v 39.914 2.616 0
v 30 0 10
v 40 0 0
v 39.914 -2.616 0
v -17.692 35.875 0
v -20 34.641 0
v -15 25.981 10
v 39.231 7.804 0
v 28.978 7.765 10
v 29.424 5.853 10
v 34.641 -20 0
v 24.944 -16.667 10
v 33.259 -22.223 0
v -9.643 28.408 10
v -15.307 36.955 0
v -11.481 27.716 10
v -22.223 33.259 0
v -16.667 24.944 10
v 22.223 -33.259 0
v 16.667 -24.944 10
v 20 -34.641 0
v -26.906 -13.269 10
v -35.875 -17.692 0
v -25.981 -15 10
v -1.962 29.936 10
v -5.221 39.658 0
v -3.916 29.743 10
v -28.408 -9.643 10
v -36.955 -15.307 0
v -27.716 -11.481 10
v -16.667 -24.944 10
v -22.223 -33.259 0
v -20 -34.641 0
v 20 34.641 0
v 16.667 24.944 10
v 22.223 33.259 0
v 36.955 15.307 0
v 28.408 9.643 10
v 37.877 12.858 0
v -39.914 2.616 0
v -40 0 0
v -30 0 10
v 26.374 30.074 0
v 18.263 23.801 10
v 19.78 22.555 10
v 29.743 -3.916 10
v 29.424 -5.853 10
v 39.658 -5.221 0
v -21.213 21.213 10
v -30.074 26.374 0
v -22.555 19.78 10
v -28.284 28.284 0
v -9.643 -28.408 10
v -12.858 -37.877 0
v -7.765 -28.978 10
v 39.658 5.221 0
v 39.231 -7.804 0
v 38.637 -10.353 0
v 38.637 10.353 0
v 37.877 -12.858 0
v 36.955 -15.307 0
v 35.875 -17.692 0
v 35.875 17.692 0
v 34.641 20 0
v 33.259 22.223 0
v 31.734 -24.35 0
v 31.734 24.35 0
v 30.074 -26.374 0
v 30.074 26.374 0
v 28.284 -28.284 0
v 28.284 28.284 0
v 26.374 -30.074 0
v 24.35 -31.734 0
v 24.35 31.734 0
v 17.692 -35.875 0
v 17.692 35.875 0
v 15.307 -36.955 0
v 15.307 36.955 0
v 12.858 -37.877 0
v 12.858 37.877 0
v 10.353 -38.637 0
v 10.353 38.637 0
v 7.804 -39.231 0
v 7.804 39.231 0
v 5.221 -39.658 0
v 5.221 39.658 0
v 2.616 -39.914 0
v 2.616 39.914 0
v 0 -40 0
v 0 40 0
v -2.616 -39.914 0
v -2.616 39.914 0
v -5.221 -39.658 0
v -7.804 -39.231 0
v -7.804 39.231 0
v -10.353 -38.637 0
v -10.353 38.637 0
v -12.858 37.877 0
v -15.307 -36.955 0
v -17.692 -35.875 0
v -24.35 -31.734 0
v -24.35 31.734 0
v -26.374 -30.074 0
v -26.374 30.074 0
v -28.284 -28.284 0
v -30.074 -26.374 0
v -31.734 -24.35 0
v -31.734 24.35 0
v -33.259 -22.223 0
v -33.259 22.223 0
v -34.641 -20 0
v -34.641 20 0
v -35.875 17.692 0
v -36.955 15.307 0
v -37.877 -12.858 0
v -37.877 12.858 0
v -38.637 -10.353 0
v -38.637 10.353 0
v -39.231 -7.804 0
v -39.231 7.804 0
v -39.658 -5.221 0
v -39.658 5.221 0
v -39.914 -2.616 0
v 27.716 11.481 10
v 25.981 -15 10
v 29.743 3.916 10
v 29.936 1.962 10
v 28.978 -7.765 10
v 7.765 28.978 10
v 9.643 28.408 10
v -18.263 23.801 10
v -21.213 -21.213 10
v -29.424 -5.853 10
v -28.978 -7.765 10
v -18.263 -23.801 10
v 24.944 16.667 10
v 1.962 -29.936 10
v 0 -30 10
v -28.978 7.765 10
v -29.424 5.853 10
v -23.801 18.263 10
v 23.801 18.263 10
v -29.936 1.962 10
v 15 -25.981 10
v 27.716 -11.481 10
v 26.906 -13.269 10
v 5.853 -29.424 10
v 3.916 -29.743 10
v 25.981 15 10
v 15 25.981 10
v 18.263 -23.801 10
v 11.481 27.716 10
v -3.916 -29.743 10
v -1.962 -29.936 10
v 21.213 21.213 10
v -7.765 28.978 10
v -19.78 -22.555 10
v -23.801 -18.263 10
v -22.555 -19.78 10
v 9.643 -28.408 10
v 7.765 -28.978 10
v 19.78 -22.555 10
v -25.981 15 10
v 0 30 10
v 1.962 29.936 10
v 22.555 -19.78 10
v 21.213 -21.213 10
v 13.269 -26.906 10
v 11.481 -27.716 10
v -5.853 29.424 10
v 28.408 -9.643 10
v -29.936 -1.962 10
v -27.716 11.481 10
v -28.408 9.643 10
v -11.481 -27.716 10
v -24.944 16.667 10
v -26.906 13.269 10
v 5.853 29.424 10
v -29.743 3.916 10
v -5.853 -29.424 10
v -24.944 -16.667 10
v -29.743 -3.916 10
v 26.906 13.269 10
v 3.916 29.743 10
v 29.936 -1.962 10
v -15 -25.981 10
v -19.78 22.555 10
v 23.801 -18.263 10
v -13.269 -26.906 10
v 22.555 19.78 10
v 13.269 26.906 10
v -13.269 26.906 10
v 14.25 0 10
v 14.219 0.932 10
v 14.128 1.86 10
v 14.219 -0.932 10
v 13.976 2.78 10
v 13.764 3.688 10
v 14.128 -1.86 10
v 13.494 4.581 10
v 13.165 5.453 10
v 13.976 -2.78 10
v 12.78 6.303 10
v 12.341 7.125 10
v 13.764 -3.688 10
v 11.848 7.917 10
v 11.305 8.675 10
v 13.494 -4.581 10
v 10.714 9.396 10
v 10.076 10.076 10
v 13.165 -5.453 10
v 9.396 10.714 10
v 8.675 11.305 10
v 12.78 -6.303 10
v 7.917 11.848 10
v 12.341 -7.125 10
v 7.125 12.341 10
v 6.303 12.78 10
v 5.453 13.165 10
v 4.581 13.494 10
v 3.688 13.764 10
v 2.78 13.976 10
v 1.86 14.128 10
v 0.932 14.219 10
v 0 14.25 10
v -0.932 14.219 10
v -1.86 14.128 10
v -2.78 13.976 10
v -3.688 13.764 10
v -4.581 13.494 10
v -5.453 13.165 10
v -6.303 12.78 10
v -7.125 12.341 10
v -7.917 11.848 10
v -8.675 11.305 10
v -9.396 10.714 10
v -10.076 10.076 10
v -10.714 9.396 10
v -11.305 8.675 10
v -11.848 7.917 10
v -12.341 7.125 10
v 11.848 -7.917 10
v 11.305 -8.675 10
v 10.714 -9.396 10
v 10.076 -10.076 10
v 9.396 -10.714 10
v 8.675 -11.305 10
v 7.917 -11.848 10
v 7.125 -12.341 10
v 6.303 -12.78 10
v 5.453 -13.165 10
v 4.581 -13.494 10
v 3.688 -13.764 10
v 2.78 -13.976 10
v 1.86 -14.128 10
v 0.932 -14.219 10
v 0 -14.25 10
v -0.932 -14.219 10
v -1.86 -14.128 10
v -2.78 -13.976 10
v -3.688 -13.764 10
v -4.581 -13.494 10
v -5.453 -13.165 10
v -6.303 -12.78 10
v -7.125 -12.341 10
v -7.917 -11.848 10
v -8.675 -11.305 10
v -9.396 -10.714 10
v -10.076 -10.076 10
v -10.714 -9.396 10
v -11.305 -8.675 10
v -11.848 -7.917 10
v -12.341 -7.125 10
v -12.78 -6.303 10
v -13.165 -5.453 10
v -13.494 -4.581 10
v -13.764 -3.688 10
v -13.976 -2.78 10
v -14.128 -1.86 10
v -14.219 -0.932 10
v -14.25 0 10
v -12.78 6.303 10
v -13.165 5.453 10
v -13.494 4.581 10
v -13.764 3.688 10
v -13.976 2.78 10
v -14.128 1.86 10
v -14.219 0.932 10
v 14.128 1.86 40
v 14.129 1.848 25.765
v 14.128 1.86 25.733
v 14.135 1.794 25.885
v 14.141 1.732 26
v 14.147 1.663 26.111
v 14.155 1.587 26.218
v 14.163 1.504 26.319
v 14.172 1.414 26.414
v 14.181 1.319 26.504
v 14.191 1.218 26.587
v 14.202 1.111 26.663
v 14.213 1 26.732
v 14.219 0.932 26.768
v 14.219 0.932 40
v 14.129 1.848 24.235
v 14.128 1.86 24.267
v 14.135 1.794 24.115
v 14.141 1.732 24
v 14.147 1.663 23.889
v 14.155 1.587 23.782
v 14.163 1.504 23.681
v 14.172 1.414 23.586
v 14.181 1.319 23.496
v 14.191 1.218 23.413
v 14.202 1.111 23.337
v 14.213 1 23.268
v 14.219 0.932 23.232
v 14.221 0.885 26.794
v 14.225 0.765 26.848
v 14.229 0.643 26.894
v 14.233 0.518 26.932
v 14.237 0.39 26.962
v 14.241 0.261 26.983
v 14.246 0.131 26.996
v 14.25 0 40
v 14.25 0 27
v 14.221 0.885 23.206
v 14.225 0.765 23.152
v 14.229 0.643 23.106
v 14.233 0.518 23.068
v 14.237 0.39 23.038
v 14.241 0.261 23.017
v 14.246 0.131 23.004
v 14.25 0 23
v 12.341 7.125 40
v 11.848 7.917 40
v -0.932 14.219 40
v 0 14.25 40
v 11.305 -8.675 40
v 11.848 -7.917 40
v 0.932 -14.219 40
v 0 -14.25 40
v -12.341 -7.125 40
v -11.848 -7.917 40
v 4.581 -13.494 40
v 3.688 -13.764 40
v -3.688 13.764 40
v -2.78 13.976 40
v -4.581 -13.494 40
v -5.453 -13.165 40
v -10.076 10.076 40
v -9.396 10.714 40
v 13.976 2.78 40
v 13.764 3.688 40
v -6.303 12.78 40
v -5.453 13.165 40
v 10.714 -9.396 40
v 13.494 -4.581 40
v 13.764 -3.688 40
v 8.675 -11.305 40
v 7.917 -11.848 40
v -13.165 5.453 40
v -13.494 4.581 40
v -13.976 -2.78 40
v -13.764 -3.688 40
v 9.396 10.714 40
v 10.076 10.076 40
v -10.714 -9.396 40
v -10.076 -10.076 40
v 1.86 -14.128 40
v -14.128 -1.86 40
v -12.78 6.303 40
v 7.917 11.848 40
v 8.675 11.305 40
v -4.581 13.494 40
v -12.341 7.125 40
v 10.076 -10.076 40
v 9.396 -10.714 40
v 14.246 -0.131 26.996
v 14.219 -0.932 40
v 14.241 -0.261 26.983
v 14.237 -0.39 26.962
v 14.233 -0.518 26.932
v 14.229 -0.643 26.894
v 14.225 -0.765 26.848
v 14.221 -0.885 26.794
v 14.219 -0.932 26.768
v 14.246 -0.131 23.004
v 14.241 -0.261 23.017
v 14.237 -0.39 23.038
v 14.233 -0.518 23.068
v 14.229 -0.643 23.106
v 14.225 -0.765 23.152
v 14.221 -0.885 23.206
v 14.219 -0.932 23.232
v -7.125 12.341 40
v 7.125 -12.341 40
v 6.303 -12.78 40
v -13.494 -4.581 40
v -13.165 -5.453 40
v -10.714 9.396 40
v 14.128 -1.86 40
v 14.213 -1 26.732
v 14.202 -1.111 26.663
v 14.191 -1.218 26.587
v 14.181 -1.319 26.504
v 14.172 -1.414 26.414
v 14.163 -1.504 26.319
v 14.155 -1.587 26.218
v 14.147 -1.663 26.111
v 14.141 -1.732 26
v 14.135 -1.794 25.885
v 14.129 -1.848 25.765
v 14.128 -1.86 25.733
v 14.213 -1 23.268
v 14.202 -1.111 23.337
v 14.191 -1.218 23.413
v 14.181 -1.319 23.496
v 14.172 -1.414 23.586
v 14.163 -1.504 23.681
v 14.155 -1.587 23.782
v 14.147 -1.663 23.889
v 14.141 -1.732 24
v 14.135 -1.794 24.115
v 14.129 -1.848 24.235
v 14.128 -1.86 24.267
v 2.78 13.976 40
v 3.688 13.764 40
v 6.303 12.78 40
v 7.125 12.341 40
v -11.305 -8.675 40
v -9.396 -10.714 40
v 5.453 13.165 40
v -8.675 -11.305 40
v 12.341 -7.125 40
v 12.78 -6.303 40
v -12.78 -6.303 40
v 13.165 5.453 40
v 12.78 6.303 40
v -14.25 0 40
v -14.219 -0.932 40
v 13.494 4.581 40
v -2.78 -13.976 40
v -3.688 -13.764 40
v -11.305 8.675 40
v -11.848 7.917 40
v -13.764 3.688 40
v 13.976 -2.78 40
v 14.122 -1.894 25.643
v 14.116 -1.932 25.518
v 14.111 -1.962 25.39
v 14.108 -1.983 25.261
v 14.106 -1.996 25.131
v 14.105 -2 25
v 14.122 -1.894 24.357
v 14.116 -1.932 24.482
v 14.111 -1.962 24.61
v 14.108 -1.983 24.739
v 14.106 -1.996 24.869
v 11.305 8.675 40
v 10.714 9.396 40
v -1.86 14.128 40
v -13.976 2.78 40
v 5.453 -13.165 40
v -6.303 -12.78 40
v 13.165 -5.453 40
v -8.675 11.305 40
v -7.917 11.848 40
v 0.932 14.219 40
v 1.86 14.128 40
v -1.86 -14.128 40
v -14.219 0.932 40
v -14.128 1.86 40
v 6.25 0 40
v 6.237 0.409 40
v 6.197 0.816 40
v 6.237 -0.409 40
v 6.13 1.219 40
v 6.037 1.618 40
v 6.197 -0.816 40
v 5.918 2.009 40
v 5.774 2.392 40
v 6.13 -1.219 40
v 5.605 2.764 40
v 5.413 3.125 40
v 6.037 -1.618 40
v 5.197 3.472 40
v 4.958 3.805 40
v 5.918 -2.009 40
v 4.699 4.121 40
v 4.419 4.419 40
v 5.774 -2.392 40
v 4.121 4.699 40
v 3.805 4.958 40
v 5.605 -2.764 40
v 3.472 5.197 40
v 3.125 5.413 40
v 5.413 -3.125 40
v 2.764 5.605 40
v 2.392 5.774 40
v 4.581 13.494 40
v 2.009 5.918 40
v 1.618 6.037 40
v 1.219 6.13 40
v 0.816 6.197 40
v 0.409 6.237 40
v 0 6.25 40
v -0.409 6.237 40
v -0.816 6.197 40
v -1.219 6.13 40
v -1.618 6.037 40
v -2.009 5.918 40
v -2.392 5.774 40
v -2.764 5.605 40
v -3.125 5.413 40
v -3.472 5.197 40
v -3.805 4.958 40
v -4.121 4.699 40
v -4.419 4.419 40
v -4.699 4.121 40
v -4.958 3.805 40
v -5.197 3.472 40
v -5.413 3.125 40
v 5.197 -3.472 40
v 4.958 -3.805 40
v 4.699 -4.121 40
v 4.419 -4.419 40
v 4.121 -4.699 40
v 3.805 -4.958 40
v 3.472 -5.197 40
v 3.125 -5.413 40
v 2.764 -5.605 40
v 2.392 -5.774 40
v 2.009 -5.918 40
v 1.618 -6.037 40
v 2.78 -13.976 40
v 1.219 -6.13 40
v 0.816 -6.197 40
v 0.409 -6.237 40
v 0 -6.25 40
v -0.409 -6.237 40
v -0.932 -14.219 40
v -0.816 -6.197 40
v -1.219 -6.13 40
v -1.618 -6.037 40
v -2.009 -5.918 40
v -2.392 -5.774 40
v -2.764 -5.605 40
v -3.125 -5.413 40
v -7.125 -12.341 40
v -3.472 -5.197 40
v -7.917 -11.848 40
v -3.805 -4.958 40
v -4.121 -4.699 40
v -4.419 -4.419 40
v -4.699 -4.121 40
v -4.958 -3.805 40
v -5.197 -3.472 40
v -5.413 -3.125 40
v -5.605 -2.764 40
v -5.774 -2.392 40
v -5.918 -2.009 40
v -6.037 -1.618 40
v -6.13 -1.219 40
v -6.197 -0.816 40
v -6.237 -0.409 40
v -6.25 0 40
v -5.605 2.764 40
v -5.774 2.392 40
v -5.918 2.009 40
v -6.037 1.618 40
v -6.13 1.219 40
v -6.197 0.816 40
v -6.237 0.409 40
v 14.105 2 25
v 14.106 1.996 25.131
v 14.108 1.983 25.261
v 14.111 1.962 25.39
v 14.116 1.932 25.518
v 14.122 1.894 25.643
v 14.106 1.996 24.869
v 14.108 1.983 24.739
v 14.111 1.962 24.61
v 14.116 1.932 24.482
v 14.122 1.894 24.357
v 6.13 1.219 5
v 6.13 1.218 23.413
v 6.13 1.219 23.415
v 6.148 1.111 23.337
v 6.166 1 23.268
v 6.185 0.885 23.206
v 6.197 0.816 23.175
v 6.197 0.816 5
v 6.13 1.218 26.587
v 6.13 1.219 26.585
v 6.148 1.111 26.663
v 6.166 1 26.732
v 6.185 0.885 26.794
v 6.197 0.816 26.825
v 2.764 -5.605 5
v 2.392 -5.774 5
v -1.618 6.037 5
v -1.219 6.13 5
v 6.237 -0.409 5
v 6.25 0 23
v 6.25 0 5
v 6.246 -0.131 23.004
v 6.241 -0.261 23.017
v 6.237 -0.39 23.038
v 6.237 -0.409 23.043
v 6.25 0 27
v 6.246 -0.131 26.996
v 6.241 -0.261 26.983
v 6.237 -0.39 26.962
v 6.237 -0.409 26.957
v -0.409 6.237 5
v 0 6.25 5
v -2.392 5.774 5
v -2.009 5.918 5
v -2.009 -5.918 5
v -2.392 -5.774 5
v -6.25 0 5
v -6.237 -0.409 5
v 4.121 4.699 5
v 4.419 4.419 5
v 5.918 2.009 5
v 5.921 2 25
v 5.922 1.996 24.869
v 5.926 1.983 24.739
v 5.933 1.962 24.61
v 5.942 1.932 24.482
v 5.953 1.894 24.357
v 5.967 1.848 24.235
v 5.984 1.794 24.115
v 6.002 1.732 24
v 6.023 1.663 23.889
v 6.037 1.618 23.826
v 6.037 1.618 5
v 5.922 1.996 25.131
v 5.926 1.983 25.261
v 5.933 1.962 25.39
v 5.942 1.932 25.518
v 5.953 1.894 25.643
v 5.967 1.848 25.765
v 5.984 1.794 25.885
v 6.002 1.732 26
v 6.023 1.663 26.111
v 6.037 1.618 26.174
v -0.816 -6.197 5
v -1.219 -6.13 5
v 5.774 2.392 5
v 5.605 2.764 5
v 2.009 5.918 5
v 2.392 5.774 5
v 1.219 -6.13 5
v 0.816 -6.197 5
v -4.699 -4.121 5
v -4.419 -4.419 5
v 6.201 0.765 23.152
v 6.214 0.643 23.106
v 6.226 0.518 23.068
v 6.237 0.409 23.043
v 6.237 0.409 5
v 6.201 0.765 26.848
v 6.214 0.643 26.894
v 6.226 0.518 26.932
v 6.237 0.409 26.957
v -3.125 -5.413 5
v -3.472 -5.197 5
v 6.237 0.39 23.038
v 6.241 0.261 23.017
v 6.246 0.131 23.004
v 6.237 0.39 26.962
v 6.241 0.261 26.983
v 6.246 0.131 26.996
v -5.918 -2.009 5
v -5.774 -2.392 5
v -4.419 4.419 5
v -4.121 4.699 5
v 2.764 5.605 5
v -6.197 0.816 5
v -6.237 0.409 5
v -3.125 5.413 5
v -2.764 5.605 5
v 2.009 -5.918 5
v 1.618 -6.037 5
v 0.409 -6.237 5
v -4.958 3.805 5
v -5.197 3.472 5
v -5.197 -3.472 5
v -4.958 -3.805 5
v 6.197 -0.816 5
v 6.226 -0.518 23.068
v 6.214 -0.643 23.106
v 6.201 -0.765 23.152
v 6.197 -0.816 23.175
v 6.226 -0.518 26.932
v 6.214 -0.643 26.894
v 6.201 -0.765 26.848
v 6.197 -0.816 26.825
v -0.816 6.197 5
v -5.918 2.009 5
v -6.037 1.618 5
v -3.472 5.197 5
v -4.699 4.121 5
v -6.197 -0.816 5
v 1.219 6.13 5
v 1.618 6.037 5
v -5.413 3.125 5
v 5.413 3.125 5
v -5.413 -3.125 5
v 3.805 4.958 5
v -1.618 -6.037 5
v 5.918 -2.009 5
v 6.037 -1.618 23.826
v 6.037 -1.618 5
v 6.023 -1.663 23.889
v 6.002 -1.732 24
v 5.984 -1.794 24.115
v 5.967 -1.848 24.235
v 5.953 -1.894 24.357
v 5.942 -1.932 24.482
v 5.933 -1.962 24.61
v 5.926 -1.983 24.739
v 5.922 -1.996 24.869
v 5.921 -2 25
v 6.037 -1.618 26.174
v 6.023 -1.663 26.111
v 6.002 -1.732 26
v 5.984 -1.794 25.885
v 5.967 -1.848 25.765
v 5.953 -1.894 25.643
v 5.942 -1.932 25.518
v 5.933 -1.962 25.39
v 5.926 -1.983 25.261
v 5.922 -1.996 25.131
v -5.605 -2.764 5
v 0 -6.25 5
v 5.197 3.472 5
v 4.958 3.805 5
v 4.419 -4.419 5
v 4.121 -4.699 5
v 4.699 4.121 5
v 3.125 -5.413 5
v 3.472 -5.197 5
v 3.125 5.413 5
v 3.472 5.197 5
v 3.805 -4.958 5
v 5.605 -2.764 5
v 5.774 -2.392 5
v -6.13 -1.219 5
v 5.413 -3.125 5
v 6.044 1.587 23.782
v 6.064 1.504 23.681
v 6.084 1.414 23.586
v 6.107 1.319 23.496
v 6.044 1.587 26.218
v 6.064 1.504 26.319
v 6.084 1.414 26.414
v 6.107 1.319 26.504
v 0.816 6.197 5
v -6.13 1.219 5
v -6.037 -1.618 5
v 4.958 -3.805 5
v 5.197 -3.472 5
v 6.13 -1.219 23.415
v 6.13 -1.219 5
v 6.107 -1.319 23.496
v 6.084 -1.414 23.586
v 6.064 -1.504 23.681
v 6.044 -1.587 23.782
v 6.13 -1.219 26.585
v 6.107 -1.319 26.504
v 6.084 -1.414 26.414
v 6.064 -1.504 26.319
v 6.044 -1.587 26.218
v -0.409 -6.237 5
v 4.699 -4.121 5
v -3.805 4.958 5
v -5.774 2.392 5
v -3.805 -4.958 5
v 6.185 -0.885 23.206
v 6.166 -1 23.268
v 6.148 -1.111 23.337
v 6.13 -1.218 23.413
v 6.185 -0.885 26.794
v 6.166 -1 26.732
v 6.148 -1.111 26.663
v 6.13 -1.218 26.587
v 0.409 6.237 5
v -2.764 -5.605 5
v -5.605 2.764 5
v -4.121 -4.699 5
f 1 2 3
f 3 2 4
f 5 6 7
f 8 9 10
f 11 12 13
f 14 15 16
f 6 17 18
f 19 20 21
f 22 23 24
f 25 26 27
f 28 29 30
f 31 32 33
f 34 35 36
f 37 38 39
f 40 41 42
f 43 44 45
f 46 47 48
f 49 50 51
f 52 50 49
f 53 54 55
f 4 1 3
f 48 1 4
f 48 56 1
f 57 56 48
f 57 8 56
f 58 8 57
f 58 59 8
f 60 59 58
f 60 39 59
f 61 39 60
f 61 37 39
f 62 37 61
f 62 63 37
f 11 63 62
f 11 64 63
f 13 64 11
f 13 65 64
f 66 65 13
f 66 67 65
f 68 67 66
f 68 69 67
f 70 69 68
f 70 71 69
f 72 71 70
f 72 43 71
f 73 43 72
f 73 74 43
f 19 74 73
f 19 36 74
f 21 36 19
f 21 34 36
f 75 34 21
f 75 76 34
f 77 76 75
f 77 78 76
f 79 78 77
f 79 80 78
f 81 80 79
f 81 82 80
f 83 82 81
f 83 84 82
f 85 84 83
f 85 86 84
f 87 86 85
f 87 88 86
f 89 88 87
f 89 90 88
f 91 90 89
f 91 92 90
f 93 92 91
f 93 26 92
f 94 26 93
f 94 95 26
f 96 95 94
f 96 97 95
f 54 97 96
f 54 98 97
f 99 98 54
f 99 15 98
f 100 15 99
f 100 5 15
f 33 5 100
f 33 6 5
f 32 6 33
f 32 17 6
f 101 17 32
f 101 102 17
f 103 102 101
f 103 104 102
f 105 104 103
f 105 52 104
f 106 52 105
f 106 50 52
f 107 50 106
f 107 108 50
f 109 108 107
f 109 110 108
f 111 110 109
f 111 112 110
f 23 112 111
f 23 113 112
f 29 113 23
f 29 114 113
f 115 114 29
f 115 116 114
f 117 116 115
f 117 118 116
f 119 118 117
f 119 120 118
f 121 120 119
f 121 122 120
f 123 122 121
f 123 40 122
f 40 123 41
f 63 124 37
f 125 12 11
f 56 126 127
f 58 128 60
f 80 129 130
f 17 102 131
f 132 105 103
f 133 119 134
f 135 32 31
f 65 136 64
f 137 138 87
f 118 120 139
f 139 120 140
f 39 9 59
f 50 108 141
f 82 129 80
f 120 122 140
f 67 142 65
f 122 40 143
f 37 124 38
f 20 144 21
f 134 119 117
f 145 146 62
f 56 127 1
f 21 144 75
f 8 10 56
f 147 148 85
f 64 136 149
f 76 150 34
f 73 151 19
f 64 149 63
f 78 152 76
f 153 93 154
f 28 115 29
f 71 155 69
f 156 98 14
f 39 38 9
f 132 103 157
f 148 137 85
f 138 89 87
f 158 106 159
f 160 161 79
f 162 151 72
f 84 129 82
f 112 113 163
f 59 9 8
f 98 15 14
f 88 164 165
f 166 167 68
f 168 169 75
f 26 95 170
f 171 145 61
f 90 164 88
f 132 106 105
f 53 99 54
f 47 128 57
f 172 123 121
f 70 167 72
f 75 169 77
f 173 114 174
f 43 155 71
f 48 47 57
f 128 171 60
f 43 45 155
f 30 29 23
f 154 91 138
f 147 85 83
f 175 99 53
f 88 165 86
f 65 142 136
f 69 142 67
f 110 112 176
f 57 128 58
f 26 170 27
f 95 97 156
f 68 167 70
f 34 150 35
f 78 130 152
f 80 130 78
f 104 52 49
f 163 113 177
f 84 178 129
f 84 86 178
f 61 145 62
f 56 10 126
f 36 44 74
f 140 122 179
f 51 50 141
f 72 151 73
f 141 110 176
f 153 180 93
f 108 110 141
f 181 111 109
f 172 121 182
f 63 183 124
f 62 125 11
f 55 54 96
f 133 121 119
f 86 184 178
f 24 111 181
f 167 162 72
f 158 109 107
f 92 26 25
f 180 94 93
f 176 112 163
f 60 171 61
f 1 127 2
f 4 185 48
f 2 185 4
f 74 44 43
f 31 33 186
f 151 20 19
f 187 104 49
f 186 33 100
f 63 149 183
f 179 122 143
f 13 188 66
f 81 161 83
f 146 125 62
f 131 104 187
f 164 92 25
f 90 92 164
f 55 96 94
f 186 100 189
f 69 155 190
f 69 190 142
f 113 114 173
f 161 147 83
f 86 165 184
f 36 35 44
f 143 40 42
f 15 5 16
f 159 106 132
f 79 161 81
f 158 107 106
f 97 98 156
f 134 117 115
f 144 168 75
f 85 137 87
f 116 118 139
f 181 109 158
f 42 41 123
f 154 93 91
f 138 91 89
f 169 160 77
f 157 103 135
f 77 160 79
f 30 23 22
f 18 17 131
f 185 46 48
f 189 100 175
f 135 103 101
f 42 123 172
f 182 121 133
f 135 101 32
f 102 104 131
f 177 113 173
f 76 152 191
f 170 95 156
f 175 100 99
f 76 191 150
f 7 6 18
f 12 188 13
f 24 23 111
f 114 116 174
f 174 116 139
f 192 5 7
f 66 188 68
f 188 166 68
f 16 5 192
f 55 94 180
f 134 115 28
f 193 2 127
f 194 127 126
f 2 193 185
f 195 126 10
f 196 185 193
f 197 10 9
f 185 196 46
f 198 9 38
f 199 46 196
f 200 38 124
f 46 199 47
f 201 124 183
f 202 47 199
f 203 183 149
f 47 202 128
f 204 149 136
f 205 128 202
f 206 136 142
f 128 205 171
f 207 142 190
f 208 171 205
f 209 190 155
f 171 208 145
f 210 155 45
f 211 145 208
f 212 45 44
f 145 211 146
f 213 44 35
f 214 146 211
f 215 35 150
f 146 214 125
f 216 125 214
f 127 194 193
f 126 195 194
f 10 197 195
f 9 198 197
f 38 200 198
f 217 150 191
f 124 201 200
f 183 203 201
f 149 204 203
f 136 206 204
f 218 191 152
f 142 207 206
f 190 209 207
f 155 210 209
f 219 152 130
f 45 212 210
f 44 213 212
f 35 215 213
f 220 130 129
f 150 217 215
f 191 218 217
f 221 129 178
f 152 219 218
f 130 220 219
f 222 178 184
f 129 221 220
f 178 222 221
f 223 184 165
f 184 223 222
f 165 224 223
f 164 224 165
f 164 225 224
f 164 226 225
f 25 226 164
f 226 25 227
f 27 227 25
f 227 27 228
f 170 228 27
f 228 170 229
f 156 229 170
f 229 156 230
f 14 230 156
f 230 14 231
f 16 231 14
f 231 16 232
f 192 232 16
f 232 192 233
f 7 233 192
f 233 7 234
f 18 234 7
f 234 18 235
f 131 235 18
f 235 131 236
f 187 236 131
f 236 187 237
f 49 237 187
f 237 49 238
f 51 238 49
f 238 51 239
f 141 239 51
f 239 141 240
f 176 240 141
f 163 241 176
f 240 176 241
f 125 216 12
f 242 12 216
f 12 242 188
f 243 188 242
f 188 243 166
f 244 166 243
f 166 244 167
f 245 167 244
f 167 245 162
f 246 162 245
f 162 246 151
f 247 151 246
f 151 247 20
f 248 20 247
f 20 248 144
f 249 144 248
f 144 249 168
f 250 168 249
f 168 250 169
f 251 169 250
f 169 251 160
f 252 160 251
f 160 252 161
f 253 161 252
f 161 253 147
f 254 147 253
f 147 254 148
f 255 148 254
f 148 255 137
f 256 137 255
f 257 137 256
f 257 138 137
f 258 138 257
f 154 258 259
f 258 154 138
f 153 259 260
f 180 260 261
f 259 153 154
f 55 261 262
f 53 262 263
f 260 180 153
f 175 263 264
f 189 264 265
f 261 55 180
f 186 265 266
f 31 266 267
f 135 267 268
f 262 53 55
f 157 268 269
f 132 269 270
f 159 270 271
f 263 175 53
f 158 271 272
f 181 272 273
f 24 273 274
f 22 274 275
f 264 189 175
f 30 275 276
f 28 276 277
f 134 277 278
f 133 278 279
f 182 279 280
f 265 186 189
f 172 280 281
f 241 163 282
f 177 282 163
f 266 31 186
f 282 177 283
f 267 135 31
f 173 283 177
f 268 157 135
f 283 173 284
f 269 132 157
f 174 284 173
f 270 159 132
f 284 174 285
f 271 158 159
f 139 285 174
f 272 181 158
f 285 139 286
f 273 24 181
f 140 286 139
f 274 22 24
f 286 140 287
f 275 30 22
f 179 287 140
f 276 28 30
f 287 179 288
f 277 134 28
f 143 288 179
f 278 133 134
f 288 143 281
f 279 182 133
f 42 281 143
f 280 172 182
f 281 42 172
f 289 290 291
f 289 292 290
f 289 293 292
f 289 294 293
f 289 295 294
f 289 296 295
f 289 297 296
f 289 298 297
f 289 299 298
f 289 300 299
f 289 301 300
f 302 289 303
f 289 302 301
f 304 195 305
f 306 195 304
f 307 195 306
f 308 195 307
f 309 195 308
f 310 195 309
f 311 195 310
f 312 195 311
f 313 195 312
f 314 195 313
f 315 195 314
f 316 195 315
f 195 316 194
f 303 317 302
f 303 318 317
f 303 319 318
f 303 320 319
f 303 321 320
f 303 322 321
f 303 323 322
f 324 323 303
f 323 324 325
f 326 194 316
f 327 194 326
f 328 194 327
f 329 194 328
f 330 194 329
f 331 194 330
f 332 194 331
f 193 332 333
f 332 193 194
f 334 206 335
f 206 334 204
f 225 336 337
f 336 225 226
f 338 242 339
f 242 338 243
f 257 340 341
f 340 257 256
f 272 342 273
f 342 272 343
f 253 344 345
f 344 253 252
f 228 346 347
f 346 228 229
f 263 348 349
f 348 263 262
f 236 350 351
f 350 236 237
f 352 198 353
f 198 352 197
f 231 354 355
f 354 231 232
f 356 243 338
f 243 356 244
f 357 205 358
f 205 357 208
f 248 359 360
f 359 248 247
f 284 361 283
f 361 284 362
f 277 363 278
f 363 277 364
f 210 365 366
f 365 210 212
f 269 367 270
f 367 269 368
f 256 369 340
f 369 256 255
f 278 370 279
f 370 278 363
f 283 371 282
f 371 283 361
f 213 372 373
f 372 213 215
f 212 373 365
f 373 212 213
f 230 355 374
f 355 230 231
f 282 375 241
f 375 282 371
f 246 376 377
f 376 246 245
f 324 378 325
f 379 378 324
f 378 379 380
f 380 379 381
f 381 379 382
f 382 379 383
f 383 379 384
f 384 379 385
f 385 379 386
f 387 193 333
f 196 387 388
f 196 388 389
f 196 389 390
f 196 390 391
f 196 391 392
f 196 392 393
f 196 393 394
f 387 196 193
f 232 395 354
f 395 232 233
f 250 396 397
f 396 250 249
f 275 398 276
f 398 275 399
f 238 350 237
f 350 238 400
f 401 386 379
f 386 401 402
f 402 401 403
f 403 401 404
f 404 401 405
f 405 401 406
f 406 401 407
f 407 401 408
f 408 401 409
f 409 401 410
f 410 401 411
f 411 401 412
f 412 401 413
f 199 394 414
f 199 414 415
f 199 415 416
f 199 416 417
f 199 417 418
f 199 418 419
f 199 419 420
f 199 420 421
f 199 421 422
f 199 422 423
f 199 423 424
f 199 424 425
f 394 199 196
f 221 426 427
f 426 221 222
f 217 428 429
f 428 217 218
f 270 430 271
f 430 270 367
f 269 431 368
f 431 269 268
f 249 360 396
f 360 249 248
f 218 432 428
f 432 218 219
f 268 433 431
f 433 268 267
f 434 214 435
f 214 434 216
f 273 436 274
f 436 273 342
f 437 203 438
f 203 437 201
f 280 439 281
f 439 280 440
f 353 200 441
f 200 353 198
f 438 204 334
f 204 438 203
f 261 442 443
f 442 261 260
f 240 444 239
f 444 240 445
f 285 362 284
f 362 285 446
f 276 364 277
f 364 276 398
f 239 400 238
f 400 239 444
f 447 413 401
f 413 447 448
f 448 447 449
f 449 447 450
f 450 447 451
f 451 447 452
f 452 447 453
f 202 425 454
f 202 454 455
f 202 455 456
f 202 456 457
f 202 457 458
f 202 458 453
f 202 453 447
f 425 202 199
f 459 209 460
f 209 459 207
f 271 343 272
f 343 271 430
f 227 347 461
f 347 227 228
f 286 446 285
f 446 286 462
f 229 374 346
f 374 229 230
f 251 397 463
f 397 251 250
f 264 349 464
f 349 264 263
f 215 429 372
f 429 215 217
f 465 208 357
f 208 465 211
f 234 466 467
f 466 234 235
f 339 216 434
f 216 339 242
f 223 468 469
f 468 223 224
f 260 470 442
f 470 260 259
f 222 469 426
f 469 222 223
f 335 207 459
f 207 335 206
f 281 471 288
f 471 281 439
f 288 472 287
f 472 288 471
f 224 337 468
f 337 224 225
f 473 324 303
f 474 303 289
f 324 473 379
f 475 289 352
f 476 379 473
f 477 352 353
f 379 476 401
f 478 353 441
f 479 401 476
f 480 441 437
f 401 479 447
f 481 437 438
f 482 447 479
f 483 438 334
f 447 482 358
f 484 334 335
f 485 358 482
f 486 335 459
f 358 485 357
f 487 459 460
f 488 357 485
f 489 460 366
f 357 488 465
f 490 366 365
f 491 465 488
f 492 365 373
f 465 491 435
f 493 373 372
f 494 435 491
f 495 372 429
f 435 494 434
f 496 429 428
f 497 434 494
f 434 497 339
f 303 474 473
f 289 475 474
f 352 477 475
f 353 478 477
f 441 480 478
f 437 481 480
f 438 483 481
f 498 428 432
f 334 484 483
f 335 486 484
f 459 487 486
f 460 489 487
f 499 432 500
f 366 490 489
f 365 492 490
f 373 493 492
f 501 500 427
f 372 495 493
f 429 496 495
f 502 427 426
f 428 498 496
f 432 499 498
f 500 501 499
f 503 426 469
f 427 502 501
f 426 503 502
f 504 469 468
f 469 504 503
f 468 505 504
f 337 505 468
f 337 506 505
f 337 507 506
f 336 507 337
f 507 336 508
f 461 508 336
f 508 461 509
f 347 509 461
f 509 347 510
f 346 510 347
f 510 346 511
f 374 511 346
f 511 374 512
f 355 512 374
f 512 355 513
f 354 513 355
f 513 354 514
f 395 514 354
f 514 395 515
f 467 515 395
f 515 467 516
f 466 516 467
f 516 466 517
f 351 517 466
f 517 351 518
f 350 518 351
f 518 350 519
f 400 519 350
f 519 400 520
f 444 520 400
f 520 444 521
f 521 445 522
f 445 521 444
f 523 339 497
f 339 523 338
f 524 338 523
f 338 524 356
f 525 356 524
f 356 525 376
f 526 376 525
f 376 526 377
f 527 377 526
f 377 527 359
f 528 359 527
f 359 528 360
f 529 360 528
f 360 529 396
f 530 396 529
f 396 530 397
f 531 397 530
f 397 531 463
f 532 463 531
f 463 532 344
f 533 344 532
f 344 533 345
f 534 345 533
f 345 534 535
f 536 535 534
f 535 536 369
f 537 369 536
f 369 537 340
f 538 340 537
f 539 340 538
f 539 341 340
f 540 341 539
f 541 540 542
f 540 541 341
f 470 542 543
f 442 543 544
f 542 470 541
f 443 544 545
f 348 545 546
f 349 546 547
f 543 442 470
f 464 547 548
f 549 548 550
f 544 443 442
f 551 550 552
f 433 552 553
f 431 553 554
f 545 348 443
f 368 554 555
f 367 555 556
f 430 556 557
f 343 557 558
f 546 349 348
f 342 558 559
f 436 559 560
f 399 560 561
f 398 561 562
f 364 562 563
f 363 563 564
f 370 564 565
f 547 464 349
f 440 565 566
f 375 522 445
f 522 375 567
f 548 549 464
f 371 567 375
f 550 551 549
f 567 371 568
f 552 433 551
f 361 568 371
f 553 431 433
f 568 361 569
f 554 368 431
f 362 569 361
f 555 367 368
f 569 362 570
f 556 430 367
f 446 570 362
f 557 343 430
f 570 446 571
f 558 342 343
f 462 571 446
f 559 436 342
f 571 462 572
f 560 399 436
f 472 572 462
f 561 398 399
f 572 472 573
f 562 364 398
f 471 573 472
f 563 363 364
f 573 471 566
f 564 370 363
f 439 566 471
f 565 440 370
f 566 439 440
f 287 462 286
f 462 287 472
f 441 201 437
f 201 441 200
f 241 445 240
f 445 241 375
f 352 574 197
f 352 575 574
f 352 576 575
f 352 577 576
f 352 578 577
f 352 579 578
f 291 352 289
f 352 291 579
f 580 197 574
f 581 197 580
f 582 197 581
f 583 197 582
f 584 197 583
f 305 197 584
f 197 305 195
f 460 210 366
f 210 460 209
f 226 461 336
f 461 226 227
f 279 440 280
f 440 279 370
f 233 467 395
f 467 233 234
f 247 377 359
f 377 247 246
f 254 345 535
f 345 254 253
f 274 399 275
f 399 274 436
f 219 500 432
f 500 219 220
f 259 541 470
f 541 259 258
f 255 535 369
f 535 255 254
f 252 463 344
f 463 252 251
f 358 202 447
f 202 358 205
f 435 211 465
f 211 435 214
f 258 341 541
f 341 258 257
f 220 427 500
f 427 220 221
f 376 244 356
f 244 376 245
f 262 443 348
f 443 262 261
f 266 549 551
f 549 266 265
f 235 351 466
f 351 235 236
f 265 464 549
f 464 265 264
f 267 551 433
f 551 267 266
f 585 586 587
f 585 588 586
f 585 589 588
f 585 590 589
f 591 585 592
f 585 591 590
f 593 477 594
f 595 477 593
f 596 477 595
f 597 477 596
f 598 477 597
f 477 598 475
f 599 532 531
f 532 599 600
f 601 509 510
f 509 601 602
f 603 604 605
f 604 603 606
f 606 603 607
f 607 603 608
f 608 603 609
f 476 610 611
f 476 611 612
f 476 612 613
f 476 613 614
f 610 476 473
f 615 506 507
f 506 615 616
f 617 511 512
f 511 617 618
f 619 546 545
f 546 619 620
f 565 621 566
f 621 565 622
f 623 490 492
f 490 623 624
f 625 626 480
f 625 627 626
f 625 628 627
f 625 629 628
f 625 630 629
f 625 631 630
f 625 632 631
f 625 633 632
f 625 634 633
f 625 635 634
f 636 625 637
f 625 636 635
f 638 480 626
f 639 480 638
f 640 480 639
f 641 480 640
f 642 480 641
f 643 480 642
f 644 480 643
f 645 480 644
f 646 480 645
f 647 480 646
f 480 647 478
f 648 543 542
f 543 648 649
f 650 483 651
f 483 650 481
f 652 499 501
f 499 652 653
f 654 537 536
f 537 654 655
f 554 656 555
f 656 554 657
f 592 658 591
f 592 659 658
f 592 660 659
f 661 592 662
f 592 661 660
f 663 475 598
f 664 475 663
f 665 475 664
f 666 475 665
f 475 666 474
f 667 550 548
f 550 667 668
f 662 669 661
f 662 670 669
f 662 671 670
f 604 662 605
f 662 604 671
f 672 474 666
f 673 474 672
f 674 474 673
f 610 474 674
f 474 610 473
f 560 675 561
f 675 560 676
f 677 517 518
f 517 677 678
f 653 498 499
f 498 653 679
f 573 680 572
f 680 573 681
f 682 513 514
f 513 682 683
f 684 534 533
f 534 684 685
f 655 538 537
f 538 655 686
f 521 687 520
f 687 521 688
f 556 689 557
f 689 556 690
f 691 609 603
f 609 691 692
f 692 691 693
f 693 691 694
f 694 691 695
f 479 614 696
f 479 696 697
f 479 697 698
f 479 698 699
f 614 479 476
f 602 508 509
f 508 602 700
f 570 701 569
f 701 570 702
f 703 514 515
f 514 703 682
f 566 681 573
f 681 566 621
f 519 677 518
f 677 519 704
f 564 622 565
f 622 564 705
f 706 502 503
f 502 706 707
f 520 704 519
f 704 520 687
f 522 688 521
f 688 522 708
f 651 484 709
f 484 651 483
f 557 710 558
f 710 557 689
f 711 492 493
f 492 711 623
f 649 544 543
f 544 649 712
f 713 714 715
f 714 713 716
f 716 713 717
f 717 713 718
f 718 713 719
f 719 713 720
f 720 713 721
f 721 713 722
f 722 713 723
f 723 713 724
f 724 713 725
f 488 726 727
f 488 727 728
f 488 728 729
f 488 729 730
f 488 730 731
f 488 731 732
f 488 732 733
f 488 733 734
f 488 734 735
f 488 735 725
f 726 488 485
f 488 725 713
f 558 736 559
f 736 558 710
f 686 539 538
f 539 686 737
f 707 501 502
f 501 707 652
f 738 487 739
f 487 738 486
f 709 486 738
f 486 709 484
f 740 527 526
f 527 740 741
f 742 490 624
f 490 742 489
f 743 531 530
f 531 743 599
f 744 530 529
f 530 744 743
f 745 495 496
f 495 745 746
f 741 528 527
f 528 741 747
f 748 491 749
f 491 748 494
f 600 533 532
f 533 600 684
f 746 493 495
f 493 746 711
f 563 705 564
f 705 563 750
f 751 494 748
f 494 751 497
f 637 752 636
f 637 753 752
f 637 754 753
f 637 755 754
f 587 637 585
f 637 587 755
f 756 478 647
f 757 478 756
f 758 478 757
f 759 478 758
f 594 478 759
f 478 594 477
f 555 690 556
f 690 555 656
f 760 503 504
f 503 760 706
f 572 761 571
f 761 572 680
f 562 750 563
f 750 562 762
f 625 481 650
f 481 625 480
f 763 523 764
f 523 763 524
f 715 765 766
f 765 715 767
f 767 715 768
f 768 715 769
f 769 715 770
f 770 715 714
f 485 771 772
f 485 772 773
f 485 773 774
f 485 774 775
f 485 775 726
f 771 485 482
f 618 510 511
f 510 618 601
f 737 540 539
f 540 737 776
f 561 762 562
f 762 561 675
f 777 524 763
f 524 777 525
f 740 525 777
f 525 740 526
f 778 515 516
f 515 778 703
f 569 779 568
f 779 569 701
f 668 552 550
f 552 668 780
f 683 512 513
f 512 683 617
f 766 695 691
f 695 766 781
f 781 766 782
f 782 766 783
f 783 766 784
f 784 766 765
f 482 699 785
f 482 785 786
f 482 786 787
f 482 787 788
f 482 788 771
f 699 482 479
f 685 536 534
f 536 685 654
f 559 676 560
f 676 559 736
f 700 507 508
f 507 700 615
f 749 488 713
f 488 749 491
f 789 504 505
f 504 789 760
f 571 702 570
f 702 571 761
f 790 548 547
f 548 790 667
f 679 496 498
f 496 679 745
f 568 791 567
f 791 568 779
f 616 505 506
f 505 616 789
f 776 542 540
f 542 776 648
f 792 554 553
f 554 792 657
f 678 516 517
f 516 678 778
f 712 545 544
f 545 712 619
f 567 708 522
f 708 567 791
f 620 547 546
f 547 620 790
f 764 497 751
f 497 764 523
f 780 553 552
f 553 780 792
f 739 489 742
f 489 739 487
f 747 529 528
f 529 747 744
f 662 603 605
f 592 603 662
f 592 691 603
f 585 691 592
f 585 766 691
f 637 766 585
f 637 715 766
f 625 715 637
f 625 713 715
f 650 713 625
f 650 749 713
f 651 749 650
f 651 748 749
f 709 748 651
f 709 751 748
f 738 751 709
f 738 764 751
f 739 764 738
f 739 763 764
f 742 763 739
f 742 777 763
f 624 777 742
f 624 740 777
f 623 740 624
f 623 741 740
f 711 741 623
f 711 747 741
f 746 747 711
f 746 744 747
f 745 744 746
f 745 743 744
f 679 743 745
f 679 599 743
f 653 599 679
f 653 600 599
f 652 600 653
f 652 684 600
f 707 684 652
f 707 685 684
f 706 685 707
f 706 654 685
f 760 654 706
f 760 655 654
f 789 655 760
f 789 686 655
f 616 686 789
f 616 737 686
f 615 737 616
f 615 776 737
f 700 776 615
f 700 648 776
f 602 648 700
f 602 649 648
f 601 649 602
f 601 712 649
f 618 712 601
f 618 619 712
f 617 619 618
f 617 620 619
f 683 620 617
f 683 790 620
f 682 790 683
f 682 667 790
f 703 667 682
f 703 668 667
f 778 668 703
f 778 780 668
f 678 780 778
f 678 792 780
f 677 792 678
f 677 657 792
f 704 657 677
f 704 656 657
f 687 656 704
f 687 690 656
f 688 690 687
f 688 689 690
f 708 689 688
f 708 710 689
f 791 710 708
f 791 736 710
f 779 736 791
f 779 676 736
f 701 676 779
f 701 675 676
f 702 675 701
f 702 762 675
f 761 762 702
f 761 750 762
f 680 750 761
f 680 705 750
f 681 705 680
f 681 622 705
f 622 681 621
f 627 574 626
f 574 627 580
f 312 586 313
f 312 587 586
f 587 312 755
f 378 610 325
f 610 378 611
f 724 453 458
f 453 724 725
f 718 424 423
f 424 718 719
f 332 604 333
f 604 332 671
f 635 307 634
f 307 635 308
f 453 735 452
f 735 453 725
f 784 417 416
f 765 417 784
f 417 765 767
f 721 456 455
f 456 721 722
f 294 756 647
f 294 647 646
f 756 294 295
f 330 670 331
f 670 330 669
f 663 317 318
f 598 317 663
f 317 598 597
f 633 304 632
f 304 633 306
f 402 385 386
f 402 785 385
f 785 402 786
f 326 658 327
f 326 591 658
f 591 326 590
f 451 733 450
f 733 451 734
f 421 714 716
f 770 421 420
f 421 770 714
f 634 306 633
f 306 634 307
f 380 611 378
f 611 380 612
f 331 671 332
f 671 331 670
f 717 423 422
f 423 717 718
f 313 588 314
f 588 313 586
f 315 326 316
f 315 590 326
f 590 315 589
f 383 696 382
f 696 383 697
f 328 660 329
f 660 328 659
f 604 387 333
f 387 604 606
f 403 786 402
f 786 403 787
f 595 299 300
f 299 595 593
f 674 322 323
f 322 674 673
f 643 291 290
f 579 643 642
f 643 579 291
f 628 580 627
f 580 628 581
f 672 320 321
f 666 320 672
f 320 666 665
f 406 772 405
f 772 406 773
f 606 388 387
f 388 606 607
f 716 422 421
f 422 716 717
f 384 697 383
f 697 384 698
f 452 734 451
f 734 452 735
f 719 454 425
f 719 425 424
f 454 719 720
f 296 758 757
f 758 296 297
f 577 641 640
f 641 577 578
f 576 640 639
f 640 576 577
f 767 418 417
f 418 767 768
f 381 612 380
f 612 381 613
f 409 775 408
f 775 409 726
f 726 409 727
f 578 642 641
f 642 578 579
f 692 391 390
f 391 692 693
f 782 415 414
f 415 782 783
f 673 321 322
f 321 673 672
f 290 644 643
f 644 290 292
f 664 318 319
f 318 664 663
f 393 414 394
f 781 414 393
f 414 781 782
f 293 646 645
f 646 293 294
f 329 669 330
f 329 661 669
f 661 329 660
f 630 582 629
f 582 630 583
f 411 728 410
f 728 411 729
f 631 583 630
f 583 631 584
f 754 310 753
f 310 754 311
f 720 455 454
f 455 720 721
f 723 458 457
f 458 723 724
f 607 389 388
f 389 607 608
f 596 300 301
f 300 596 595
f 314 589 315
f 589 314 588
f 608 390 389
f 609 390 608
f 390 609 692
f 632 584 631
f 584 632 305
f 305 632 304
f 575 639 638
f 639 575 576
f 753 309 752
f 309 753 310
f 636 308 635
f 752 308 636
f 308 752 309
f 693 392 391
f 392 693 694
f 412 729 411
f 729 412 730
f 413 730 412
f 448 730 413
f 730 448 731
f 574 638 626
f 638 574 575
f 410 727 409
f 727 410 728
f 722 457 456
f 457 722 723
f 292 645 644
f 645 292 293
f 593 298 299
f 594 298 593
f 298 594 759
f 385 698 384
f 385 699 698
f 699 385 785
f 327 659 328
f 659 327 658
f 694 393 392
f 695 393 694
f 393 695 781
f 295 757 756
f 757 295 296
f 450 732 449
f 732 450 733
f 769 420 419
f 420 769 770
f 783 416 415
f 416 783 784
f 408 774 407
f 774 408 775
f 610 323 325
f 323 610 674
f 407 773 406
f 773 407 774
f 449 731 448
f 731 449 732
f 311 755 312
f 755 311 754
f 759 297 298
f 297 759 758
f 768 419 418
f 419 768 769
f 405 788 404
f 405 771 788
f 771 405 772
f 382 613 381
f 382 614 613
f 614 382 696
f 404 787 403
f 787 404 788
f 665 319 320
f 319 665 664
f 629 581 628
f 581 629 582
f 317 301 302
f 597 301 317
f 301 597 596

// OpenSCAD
// ============= PIE PARA VARILLA =============
// Base pesada con alojamiento vertical y tornillo
// prisionero para fijar una varilla de soporte.

/* [Pie] */
// Diámetro de la base (mm)
diametro_base = 80; // [40:170]
// Altura de la base (mm)
altura_base = 10; // [6:25]
// Diámetro de la varilla (mm)
diametro_varilla = 12.5; // [4:0.5:30]
// Altura del cubo portavarilla (mm)
altura_cubo = 30; // [15:70]
// Espesor de pared del cubo (mm)
pared = 8; // [4:18]
// Diámetro del tornillo prisionero (mm)
prisionero = 4; // [2:8]

/* [Calidad] */
// Resolución de las curvas
resolucion = 96; // [24:160]

/* [Hidden] */
$fn = resolucion;
d_cubo = diametro_varilla + 2 * pared;

difference() {
    union() {
        // Base con borde achaflanado
        cylinder(h = altura_base, d1 = diametro_base,
                 d2 = max(diametro_base - 2 * altura_base, d_cubo));
        // Cubo portavarilla
        cylinder(h = altura_base + altura_cubo, d = d_cubo);
    }
    // Alojamiento de la varilla (ciego)
    translate([0, 0, altura_base / 2])
        cylinder(h = altura_base / 2 + altura_cubo + 1, d = diametro_varilla);
    // Tornillo prisionero
    translate([0, 0, altura_base + altura_cubo / 2])
        rotate([0, 90, 0])
            cylinder(h = d_cubo, d = prisionero);
}
